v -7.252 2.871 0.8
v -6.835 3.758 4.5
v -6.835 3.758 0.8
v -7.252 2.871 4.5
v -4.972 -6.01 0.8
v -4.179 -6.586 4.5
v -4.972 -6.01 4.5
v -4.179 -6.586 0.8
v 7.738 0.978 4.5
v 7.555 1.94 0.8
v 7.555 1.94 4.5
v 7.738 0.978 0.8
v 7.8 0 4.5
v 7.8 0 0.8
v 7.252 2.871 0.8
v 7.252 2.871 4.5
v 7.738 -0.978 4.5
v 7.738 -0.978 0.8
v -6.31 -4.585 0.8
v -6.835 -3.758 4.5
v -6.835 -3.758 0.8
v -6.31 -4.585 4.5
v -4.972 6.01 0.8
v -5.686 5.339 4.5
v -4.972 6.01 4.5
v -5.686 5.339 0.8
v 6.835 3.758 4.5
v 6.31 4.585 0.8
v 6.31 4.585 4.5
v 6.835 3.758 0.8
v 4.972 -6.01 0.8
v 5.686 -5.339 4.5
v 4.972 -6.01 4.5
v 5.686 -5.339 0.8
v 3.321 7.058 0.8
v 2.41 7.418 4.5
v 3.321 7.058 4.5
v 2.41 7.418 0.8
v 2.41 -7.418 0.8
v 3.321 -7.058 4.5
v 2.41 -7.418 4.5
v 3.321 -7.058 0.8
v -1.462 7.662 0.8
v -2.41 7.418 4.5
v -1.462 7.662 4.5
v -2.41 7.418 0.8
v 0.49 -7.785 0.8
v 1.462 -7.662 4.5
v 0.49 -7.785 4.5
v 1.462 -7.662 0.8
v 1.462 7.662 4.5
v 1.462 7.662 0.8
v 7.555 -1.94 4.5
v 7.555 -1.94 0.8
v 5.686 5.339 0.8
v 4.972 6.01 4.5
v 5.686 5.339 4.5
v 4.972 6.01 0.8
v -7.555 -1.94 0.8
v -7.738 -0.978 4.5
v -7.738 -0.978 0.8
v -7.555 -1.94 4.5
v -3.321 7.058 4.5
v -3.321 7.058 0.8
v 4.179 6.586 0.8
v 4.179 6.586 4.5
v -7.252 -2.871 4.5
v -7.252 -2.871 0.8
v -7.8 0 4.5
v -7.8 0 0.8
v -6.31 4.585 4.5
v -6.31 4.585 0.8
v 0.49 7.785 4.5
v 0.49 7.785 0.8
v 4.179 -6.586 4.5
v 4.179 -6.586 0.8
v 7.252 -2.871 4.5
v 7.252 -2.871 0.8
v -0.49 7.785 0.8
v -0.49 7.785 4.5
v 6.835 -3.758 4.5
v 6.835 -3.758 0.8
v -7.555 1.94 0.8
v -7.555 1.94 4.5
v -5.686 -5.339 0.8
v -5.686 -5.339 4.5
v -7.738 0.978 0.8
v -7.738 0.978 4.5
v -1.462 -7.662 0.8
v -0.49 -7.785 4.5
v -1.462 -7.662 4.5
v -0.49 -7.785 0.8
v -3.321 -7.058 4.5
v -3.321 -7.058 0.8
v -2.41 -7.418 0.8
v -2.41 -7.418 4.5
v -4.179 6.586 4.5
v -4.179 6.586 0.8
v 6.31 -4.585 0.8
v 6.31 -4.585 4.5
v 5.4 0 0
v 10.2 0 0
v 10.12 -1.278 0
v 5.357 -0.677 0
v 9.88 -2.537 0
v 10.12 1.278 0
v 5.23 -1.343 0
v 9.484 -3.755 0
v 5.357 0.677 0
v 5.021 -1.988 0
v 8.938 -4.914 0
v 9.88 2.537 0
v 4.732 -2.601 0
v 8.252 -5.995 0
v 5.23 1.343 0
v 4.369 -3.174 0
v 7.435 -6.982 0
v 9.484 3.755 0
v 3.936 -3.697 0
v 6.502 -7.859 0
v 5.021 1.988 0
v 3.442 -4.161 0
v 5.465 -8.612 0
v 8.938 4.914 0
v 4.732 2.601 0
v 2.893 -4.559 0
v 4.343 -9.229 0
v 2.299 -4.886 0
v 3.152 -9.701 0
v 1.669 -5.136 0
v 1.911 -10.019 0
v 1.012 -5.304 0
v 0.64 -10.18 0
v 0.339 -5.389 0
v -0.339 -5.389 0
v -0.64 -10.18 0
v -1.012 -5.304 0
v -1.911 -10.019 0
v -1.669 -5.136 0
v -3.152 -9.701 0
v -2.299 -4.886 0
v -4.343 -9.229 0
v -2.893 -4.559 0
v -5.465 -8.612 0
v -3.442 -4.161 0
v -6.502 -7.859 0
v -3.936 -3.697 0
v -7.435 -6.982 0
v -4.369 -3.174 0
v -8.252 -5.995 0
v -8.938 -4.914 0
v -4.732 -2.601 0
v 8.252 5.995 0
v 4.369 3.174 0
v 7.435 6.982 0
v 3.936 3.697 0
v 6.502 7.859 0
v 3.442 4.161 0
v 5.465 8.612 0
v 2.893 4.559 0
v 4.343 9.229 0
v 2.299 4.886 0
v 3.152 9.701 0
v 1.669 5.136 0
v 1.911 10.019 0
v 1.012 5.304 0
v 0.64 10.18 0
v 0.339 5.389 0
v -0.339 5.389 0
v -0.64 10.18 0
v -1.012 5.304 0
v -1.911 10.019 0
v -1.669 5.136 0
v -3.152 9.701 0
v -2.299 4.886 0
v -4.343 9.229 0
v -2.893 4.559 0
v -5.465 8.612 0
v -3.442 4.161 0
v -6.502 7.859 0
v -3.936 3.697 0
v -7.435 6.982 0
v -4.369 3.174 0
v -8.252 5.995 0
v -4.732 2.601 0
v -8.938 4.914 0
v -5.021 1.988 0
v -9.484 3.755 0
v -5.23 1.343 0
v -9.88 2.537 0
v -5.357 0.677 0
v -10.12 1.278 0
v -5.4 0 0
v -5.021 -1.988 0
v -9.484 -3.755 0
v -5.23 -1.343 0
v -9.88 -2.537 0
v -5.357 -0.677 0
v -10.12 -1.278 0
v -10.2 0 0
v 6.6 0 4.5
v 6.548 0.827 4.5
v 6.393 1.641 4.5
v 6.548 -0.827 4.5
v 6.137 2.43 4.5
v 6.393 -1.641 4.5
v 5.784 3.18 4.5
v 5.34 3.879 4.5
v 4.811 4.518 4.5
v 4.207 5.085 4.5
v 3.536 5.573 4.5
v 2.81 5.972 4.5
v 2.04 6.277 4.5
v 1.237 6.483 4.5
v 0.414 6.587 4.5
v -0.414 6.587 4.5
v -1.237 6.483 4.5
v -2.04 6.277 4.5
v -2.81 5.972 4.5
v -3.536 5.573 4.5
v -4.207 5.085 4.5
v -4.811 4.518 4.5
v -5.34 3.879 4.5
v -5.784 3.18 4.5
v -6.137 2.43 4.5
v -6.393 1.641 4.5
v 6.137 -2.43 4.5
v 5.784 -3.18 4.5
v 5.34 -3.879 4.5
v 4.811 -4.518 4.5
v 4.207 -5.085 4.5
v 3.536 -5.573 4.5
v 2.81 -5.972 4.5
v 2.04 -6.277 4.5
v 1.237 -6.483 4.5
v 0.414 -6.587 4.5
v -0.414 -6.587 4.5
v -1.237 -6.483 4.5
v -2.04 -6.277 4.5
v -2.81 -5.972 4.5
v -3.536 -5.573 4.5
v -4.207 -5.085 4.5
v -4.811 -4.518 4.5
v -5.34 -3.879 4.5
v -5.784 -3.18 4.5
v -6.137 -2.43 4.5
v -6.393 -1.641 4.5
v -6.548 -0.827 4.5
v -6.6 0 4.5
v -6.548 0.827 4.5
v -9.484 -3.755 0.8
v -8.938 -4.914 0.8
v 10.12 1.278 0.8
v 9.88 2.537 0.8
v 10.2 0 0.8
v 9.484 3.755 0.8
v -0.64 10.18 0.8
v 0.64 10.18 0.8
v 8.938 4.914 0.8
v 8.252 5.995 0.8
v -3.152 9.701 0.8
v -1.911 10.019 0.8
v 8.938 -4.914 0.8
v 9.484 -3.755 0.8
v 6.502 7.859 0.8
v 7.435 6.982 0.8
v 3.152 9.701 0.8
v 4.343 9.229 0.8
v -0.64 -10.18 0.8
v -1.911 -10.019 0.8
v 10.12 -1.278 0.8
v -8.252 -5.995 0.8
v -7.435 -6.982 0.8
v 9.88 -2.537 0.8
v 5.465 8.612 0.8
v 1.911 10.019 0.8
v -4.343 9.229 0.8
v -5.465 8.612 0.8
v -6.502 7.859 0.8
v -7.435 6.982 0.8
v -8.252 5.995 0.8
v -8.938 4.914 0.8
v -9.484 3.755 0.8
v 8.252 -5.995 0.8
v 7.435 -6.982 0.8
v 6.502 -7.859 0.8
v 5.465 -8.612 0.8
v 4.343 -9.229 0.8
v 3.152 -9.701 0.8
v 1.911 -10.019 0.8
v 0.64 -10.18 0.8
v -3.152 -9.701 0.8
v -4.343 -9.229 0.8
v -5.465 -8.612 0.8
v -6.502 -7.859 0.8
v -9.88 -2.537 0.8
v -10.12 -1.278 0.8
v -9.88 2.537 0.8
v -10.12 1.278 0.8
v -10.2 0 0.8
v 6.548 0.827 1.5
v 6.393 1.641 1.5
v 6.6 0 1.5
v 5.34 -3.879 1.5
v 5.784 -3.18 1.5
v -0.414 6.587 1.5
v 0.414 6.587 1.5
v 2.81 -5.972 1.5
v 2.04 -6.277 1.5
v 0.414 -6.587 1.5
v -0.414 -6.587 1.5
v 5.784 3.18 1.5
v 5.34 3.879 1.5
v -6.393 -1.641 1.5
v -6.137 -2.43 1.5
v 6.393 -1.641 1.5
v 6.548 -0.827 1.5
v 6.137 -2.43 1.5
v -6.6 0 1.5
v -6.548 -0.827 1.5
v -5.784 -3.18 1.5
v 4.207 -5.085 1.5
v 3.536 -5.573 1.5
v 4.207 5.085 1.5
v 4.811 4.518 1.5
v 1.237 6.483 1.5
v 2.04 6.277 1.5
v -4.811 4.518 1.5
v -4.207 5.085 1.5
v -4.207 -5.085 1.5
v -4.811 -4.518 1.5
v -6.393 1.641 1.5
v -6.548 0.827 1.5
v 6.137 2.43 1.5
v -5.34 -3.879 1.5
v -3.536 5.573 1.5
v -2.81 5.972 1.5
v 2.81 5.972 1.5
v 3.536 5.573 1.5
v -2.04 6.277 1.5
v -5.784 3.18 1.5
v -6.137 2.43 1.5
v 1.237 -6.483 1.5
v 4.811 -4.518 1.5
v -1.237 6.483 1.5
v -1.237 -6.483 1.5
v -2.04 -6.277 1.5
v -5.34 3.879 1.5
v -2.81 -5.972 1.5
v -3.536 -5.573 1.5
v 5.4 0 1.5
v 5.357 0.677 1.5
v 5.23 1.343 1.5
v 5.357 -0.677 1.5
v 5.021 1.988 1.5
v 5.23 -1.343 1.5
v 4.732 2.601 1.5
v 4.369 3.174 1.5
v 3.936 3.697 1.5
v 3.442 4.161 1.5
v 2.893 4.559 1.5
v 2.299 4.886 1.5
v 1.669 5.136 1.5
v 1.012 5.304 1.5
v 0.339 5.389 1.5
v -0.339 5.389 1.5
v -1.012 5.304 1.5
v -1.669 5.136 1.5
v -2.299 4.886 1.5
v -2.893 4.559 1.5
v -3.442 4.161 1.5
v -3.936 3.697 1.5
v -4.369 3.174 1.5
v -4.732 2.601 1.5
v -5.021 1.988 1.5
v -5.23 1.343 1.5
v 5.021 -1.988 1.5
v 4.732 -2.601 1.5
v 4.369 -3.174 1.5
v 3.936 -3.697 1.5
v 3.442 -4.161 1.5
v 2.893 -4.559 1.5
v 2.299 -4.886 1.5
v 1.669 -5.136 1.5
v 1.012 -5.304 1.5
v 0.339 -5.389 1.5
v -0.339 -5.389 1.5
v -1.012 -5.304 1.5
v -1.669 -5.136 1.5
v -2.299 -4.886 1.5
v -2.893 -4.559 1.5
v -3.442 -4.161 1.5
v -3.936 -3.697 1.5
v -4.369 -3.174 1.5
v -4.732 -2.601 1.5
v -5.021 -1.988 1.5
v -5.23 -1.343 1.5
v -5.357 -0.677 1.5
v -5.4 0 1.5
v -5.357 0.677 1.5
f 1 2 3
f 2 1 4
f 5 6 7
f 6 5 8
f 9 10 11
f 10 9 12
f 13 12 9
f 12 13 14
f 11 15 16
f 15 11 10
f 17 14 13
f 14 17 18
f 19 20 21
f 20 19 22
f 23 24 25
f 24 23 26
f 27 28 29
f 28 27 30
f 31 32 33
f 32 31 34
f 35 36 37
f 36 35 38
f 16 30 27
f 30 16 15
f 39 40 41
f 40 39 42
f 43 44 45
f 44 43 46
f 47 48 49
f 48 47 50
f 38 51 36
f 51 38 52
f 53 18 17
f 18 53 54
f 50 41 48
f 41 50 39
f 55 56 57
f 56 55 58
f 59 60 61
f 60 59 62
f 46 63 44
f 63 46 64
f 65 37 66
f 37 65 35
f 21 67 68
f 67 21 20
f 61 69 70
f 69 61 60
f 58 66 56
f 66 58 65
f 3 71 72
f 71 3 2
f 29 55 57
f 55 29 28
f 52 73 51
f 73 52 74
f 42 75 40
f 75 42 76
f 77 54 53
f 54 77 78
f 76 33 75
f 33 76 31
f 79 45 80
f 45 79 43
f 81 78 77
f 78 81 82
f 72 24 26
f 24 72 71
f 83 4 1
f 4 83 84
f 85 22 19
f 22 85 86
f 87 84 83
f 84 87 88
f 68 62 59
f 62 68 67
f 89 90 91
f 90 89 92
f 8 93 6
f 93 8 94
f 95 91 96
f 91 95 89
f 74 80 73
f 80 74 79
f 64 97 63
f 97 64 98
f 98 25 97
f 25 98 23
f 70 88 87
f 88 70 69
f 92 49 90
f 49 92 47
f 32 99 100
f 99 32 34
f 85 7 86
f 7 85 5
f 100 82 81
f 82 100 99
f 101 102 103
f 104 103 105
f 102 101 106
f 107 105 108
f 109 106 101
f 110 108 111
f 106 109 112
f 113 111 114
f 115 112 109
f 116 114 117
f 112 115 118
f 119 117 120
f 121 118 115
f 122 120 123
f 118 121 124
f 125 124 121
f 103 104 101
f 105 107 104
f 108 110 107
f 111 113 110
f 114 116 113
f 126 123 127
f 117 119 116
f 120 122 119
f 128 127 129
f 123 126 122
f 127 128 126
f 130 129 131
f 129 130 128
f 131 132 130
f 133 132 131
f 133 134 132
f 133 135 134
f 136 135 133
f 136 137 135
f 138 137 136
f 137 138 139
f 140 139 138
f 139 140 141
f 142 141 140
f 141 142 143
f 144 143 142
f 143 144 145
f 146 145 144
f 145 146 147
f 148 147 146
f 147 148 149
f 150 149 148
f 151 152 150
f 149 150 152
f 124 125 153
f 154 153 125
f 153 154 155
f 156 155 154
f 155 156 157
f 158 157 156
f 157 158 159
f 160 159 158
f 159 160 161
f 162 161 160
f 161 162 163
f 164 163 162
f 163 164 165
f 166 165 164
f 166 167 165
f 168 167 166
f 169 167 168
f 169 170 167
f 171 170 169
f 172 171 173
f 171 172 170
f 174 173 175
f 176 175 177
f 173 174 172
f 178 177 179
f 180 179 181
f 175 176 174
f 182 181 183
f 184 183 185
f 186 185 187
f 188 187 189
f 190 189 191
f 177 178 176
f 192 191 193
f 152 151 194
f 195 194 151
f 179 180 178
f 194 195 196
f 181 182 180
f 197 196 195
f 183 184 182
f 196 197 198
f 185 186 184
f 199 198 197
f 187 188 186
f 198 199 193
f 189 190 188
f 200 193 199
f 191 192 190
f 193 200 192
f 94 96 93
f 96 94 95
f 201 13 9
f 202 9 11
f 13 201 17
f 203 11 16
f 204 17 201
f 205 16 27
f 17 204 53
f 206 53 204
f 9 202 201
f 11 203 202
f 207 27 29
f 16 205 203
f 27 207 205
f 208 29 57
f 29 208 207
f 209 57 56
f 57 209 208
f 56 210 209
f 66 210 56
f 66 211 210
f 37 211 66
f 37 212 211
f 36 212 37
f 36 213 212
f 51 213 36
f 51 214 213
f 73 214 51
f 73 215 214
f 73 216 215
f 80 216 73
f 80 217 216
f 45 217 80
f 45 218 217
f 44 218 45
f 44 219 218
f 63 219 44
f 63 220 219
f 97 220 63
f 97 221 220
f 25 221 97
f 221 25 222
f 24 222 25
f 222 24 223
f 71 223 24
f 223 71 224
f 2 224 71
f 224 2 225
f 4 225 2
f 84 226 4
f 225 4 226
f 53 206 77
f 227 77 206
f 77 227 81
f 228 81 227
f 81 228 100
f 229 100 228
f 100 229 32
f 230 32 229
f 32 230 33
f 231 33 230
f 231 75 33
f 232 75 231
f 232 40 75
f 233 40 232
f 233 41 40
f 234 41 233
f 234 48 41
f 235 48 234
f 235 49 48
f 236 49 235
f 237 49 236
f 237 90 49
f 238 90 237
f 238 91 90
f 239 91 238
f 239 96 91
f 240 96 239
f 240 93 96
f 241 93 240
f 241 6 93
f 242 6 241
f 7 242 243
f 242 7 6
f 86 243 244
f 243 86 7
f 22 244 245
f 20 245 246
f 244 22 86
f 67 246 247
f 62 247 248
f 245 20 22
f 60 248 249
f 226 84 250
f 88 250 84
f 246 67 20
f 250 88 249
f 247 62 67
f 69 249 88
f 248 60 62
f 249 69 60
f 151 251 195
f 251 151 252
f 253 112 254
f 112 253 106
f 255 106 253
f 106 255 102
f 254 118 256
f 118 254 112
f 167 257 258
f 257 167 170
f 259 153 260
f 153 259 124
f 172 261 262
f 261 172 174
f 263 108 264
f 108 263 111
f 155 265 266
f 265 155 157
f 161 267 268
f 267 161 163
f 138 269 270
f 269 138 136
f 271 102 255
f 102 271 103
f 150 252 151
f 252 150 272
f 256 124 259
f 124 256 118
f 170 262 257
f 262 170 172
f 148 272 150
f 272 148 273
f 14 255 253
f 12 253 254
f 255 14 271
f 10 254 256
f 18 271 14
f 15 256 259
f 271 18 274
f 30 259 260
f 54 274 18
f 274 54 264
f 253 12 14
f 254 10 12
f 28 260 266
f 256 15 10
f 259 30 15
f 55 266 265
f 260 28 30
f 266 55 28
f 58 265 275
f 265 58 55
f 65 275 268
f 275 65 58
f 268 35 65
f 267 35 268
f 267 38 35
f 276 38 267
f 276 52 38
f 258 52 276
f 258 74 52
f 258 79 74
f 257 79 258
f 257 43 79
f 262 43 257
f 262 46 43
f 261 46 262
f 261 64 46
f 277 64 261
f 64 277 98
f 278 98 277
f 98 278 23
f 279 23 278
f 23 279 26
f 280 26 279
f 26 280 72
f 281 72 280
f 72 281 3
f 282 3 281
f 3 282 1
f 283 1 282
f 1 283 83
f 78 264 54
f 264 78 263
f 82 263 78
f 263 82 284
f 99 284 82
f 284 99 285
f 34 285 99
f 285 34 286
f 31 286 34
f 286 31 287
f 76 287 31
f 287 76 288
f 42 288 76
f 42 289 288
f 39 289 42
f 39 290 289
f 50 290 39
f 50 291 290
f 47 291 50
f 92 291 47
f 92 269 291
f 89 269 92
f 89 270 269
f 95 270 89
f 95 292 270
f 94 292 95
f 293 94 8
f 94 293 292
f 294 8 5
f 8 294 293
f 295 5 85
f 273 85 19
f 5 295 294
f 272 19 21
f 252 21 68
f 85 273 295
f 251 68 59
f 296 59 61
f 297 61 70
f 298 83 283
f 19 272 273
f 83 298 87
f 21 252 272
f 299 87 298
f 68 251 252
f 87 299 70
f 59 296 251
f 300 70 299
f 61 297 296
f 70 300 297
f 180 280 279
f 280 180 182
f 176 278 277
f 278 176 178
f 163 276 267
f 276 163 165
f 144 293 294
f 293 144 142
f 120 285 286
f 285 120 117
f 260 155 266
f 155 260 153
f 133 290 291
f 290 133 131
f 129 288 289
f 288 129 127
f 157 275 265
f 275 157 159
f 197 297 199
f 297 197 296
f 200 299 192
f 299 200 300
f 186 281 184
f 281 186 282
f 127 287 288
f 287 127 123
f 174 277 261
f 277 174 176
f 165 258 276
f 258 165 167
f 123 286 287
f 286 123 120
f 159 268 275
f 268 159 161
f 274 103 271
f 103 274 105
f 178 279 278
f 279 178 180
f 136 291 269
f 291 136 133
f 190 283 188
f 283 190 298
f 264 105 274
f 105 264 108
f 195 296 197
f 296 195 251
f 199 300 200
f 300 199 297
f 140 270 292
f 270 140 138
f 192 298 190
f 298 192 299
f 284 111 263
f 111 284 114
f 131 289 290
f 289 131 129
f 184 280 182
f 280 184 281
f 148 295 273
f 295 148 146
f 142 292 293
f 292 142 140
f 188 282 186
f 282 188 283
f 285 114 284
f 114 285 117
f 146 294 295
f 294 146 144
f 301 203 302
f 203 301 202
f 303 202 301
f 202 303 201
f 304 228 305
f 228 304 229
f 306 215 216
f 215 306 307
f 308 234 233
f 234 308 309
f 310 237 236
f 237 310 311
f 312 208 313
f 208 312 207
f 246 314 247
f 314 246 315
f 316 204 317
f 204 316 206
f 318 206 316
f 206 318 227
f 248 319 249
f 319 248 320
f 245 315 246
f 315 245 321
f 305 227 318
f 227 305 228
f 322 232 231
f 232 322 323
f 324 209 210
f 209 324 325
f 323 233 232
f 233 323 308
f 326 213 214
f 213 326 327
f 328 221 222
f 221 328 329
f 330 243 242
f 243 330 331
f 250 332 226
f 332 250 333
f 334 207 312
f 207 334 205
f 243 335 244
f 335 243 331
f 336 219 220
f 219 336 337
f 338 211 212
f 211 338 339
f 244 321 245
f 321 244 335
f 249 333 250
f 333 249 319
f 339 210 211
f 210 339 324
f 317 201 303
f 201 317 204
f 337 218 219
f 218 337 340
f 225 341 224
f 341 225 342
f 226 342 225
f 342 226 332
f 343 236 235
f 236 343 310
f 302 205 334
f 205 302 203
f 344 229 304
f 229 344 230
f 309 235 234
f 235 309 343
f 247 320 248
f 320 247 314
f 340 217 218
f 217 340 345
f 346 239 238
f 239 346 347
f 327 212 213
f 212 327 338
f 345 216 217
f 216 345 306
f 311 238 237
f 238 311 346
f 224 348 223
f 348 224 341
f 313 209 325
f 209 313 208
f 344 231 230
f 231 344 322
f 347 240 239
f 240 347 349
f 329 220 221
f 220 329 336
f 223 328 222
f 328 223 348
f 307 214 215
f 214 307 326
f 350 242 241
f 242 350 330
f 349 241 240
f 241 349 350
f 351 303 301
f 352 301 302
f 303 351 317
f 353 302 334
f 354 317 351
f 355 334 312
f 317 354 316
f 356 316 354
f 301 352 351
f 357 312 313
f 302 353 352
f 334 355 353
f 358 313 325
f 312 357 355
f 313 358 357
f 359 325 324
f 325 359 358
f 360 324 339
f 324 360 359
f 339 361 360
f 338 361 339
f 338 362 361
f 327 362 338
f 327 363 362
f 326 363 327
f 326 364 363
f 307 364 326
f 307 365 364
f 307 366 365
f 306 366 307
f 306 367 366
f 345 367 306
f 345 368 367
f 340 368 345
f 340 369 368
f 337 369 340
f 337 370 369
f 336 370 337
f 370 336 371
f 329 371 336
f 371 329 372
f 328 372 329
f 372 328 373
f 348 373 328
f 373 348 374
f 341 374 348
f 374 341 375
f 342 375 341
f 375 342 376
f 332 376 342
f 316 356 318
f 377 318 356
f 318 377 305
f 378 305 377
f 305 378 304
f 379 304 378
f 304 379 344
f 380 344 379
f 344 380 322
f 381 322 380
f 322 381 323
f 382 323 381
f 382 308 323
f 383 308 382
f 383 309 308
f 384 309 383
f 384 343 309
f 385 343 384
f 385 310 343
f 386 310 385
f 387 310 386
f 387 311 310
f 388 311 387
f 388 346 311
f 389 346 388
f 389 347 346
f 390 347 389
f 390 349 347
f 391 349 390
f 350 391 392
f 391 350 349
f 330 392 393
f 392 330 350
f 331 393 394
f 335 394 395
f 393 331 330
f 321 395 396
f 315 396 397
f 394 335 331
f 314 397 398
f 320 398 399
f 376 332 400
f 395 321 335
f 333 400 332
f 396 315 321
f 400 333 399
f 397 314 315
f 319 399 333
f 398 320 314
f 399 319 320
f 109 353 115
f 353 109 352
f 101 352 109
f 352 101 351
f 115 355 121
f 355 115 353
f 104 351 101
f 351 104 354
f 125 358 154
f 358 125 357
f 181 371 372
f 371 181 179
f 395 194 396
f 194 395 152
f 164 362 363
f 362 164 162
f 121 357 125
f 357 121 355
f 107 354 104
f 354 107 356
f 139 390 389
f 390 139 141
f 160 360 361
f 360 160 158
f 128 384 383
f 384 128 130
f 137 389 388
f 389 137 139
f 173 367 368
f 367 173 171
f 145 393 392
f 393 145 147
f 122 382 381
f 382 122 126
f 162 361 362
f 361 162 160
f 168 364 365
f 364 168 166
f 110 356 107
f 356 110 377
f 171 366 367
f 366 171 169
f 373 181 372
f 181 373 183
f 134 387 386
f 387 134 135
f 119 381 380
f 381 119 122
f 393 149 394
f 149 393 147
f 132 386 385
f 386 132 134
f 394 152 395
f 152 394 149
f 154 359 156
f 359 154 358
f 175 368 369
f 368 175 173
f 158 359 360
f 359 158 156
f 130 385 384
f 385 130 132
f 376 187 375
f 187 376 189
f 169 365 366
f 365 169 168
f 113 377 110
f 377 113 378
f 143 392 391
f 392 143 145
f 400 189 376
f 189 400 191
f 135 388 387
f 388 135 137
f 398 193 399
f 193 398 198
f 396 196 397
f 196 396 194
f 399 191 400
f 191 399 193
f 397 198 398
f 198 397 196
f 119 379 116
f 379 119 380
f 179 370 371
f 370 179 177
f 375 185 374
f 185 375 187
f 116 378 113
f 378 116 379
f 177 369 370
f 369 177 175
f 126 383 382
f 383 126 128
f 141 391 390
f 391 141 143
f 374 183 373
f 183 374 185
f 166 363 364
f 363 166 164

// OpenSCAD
// PRUSA iteration3
// 624 bearing belt guide
// GNU GPL v3
// Josef Průša <iam@josefprusa.cz> and contributors
// http://www.reprap.org/wiki/Prusa_Mendel
// http://prusamendel.org

wall= 1.2;
clearence= 0.1; 

module belt_guide_base(){
 cylinder(r=6.5+wall+clearence, h=4.5, $fn=50);
 cylinder(r=6.5+wall+clearence+2*wall, h=0.8, $fn=50);
}

module belt_guide_holes(){
 translate([0,0,1.5]) cylinder(r=6.5+clearence, h=10, $fn=50);
 translate([0,0,-1]) cylinder(r=6.5+wall+clearence-2*wall, h=10, $fn=50);
}

// Final part
module belt_guide(){
 difference(){
  belt_guide_base();
  belt_guide_holes();
 }
}

belt_guide();
